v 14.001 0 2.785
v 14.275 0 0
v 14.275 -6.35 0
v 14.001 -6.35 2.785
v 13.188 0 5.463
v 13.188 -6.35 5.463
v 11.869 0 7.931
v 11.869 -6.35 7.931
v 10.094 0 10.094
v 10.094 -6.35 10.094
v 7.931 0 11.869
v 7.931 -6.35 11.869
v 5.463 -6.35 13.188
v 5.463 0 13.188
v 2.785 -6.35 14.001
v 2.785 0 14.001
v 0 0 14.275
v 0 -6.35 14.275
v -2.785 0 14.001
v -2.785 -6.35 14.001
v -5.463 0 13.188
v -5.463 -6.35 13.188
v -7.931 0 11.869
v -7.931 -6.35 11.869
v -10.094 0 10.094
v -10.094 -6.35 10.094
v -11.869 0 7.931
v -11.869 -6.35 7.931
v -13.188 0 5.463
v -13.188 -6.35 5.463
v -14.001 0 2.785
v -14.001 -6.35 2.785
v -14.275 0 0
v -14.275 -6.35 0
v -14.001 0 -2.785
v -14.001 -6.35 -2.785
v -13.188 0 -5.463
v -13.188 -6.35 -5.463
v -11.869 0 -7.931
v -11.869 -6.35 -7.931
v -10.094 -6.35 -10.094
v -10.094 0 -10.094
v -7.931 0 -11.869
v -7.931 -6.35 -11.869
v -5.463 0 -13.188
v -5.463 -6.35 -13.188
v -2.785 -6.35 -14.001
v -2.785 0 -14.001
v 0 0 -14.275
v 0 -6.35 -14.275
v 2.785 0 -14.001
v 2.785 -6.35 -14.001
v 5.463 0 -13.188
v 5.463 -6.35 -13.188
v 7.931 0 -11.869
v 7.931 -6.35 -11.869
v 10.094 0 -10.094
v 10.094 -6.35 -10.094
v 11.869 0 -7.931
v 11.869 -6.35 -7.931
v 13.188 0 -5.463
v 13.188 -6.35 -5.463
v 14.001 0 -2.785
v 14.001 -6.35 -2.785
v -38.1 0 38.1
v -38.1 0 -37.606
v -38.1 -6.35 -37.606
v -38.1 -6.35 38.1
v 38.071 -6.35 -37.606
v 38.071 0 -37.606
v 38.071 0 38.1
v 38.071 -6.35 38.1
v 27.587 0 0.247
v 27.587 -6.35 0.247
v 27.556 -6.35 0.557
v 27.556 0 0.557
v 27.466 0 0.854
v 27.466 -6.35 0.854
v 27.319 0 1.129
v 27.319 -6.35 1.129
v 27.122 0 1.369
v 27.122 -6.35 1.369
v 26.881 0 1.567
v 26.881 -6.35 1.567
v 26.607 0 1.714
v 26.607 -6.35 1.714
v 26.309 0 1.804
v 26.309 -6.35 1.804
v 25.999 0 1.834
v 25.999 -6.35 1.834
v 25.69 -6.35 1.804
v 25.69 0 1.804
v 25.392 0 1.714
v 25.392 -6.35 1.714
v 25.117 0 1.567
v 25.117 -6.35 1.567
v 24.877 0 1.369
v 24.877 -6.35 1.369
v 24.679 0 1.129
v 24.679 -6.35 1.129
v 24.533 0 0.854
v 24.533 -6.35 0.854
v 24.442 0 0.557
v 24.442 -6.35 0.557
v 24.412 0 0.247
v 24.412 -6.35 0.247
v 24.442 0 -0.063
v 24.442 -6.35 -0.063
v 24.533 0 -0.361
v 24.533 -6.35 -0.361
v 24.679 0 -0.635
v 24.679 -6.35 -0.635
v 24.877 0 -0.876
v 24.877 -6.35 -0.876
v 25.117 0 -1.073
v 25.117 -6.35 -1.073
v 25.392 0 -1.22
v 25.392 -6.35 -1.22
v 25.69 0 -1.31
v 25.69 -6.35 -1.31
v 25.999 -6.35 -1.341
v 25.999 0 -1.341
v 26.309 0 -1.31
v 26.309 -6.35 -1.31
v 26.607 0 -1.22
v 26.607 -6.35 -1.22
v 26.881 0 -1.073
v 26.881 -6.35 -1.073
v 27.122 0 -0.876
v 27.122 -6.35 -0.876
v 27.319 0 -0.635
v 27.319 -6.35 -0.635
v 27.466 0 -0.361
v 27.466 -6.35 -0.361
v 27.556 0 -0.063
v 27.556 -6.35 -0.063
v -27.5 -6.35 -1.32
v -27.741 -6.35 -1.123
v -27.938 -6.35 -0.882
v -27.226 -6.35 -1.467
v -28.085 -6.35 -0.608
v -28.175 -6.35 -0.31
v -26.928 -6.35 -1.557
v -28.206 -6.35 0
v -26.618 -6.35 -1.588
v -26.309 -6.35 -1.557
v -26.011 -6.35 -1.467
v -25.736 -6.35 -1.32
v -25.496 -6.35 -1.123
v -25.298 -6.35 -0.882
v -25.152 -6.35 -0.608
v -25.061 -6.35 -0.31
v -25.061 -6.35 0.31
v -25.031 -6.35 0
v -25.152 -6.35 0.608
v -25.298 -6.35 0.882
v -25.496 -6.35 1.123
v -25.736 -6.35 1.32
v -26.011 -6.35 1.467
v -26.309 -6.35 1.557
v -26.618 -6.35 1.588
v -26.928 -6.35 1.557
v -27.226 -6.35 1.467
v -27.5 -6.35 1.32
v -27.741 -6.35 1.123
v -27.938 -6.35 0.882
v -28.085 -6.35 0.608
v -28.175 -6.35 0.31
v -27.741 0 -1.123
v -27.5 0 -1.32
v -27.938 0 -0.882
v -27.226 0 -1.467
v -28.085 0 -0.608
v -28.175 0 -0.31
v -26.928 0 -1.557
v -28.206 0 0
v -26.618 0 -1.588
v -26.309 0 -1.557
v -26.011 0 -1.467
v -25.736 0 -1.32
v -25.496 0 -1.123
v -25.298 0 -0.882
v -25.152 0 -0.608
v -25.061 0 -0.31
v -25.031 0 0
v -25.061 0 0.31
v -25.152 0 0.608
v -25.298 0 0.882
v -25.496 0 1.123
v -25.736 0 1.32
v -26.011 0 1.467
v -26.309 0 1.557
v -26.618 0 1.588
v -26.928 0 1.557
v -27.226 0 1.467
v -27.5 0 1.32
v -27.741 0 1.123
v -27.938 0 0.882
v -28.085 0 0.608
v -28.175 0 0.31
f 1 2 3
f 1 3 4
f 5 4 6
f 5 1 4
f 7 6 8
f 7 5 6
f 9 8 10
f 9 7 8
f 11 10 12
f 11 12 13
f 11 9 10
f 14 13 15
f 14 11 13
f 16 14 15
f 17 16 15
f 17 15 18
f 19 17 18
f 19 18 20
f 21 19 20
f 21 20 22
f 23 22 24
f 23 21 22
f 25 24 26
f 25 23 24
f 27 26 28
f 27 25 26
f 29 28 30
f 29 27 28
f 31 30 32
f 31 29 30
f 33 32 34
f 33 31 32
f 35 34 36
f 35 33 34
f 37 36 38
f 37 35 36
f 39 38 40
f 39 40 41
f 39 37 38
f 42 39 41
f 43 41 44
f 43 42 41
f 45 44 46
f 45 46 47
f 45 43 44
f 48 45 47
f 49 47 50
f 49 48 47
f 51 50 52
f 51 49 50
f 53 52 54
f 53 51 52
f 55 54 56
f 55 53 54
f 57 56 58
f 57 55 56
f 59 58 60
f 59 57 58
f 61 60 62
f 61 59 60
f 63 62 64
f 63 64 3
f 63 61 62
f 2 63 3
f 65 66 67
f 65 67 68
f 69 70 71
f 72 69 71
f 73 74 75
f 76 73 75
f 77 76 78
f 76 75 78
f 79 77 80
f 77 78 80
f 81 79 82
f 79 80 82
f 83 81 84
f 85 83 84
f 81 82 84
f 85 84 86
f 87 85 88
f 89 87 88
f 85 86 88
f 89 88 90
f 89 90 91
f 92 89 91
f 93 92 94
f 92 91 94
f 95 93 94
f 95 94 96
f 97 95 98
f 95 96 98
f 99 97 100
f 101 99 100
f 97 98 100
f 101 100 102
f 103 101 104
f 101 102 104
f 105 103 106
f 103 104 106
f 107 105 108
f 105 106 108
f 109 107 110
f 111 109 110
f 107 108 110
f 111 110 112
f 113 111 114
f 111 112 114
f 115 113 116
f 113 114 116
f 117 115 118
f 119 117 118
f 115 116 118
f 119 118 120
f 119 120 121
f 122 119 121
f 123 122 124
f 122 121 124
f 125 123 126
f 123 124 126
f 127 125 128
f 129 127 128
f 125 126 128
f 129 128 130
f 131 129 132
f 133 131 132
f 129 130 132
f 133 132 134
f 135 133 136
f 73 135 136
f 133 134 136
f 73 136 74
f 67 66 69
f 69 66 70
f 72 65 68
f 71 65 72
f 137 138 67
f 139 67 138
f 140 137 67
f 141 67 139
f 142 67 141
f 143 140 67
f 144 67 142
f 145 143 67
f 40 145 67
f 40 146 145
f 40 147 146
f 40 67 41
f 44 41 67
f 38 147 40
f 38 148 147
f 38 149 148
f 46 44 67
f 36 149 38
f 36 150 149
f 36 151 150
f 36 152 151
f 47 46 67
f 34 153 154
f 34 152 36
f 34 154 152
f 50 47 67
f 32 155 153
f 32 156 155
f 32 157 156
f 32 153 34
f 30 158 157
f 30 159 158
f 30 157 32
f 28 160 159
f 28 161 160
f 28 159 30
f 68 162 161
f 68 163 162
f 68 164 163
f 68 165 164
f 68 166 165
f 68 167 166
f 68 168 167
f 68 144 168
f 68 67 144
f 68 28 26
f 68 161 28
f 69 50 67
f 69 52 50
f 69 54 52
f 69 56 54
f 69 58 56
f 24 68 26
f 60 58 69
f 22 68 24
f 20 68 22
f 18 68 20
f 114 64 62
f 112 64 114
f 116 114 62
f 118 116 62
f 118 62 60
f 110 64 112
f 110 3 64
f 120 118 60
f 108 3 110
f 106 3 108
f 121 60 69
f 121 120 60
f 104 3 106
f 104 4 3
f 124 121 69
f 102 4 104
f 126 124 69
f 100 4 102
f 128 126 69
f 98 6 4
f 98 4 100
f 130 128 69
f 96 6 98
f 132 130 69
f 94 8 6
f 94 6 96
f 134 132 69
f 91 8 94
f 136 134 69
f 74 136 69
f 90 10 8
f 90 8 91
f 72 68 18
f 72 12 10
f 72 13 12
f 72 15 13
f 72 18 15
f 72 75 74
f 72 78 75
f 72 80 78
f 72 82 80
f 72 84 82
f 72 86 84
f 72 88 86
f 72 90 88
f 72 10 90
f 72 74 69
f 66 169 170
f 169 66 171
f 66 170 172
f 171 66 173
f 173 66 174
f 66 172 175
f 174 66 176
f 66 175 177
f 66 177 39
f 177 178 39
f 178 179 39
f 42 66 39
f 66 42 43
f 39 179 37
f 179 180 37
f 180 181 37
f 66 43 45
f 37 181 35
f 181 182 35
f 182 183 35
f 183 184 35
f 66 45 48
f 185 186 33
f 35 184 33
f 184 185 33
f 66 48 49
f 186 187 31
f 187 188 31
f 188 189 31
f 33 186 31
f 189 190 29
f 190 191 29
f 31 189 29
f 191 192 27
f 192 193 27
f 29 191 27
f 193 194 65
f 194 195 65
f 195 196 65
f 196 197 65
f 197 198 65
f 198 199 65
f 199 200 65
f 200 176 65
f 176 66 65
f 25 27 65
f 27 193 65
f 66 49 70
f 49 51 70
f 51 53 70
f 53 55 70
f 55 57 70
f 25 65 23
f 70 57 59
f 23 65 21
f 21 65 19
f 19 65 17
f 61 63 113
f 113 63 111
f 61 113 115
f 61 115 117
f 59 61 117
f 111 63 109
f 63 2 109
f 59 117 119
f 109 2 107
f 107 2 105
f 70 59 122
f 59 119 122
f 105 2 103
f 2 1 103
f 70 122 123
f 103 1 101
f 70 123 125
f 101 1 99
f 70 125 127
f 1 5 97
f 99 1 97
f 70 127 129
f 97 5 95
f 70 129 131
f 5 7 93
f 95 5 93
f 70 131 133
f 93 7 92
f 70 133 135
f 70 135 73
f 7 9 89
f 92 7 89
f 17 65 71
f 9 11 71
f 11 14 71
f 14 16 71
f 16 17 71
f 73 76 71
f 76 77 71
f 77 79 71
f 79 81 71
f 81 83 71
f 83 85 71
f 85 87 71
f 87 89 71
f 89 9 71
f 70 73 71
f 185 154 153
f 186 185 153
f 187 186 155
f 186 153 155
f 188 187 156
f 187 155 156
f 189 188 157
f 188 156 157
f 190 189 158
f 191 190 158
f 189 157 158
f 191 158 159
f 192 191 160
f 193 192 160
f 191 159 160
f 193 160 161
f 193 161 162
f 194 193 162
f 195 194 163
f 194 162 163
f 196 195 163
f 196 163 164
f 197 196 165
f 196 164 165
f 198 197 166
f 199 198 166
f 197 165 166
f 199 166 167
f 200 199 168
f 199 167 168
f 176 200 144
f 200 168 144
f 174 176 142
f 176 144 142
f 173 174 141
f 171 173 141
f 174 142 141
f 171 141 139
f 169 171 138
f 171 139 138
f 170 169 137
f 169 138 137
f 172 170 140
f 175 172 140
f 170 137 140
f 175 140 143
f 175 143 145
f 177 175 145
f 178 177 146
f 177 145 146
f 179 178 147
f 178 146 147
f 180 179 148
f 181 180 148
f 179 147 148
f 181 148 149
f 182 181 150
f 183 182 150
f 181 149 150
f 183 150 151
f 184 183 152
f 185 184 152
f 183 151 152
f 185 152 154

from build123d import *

# Parameters (mm, degrees)
F0_W     = 76.170526
F0_H     = 75.706247
F0_R     = 14.2748
F1_DEPTH = 6.35
F2_R     = 1.5875
F3_DEPTH = 6.35
F4_R     = 1.5875
F5_DEPTH = 6.35


with BuildPart() as f1:
    # F0 (on Front) → F1 (new body)
    with BuildSketch(Plane.XZ):
        with Locations((-0.014737, 0.246877)):
            Rectangle(F0_W, F0_H)
        Circle(F0_R, mode=Mode.SUBTRACT)
    extrude(amount=F1_DEPTH)

    # F2 (on face) → F3 (cut)
    with BuildSketch(Plane.XZ.offset(6.35)):
        with Locations((-26.618414, 0)):
            Circle(F2_R)
    extrude(amount=-F3_DEPTH, mode=Mode.SUBTRACT)

    # F4 (on face) → F5 (cut)
    with BuildSketch(Plane.XZ.offset(6.35)):
        with Locations((25.999378, 0.246877)):
            Circle(F4_R)
    extrude(amount=-F5_DEPTH, mode=Mode.SUBTRACT)


solid = f1.part
